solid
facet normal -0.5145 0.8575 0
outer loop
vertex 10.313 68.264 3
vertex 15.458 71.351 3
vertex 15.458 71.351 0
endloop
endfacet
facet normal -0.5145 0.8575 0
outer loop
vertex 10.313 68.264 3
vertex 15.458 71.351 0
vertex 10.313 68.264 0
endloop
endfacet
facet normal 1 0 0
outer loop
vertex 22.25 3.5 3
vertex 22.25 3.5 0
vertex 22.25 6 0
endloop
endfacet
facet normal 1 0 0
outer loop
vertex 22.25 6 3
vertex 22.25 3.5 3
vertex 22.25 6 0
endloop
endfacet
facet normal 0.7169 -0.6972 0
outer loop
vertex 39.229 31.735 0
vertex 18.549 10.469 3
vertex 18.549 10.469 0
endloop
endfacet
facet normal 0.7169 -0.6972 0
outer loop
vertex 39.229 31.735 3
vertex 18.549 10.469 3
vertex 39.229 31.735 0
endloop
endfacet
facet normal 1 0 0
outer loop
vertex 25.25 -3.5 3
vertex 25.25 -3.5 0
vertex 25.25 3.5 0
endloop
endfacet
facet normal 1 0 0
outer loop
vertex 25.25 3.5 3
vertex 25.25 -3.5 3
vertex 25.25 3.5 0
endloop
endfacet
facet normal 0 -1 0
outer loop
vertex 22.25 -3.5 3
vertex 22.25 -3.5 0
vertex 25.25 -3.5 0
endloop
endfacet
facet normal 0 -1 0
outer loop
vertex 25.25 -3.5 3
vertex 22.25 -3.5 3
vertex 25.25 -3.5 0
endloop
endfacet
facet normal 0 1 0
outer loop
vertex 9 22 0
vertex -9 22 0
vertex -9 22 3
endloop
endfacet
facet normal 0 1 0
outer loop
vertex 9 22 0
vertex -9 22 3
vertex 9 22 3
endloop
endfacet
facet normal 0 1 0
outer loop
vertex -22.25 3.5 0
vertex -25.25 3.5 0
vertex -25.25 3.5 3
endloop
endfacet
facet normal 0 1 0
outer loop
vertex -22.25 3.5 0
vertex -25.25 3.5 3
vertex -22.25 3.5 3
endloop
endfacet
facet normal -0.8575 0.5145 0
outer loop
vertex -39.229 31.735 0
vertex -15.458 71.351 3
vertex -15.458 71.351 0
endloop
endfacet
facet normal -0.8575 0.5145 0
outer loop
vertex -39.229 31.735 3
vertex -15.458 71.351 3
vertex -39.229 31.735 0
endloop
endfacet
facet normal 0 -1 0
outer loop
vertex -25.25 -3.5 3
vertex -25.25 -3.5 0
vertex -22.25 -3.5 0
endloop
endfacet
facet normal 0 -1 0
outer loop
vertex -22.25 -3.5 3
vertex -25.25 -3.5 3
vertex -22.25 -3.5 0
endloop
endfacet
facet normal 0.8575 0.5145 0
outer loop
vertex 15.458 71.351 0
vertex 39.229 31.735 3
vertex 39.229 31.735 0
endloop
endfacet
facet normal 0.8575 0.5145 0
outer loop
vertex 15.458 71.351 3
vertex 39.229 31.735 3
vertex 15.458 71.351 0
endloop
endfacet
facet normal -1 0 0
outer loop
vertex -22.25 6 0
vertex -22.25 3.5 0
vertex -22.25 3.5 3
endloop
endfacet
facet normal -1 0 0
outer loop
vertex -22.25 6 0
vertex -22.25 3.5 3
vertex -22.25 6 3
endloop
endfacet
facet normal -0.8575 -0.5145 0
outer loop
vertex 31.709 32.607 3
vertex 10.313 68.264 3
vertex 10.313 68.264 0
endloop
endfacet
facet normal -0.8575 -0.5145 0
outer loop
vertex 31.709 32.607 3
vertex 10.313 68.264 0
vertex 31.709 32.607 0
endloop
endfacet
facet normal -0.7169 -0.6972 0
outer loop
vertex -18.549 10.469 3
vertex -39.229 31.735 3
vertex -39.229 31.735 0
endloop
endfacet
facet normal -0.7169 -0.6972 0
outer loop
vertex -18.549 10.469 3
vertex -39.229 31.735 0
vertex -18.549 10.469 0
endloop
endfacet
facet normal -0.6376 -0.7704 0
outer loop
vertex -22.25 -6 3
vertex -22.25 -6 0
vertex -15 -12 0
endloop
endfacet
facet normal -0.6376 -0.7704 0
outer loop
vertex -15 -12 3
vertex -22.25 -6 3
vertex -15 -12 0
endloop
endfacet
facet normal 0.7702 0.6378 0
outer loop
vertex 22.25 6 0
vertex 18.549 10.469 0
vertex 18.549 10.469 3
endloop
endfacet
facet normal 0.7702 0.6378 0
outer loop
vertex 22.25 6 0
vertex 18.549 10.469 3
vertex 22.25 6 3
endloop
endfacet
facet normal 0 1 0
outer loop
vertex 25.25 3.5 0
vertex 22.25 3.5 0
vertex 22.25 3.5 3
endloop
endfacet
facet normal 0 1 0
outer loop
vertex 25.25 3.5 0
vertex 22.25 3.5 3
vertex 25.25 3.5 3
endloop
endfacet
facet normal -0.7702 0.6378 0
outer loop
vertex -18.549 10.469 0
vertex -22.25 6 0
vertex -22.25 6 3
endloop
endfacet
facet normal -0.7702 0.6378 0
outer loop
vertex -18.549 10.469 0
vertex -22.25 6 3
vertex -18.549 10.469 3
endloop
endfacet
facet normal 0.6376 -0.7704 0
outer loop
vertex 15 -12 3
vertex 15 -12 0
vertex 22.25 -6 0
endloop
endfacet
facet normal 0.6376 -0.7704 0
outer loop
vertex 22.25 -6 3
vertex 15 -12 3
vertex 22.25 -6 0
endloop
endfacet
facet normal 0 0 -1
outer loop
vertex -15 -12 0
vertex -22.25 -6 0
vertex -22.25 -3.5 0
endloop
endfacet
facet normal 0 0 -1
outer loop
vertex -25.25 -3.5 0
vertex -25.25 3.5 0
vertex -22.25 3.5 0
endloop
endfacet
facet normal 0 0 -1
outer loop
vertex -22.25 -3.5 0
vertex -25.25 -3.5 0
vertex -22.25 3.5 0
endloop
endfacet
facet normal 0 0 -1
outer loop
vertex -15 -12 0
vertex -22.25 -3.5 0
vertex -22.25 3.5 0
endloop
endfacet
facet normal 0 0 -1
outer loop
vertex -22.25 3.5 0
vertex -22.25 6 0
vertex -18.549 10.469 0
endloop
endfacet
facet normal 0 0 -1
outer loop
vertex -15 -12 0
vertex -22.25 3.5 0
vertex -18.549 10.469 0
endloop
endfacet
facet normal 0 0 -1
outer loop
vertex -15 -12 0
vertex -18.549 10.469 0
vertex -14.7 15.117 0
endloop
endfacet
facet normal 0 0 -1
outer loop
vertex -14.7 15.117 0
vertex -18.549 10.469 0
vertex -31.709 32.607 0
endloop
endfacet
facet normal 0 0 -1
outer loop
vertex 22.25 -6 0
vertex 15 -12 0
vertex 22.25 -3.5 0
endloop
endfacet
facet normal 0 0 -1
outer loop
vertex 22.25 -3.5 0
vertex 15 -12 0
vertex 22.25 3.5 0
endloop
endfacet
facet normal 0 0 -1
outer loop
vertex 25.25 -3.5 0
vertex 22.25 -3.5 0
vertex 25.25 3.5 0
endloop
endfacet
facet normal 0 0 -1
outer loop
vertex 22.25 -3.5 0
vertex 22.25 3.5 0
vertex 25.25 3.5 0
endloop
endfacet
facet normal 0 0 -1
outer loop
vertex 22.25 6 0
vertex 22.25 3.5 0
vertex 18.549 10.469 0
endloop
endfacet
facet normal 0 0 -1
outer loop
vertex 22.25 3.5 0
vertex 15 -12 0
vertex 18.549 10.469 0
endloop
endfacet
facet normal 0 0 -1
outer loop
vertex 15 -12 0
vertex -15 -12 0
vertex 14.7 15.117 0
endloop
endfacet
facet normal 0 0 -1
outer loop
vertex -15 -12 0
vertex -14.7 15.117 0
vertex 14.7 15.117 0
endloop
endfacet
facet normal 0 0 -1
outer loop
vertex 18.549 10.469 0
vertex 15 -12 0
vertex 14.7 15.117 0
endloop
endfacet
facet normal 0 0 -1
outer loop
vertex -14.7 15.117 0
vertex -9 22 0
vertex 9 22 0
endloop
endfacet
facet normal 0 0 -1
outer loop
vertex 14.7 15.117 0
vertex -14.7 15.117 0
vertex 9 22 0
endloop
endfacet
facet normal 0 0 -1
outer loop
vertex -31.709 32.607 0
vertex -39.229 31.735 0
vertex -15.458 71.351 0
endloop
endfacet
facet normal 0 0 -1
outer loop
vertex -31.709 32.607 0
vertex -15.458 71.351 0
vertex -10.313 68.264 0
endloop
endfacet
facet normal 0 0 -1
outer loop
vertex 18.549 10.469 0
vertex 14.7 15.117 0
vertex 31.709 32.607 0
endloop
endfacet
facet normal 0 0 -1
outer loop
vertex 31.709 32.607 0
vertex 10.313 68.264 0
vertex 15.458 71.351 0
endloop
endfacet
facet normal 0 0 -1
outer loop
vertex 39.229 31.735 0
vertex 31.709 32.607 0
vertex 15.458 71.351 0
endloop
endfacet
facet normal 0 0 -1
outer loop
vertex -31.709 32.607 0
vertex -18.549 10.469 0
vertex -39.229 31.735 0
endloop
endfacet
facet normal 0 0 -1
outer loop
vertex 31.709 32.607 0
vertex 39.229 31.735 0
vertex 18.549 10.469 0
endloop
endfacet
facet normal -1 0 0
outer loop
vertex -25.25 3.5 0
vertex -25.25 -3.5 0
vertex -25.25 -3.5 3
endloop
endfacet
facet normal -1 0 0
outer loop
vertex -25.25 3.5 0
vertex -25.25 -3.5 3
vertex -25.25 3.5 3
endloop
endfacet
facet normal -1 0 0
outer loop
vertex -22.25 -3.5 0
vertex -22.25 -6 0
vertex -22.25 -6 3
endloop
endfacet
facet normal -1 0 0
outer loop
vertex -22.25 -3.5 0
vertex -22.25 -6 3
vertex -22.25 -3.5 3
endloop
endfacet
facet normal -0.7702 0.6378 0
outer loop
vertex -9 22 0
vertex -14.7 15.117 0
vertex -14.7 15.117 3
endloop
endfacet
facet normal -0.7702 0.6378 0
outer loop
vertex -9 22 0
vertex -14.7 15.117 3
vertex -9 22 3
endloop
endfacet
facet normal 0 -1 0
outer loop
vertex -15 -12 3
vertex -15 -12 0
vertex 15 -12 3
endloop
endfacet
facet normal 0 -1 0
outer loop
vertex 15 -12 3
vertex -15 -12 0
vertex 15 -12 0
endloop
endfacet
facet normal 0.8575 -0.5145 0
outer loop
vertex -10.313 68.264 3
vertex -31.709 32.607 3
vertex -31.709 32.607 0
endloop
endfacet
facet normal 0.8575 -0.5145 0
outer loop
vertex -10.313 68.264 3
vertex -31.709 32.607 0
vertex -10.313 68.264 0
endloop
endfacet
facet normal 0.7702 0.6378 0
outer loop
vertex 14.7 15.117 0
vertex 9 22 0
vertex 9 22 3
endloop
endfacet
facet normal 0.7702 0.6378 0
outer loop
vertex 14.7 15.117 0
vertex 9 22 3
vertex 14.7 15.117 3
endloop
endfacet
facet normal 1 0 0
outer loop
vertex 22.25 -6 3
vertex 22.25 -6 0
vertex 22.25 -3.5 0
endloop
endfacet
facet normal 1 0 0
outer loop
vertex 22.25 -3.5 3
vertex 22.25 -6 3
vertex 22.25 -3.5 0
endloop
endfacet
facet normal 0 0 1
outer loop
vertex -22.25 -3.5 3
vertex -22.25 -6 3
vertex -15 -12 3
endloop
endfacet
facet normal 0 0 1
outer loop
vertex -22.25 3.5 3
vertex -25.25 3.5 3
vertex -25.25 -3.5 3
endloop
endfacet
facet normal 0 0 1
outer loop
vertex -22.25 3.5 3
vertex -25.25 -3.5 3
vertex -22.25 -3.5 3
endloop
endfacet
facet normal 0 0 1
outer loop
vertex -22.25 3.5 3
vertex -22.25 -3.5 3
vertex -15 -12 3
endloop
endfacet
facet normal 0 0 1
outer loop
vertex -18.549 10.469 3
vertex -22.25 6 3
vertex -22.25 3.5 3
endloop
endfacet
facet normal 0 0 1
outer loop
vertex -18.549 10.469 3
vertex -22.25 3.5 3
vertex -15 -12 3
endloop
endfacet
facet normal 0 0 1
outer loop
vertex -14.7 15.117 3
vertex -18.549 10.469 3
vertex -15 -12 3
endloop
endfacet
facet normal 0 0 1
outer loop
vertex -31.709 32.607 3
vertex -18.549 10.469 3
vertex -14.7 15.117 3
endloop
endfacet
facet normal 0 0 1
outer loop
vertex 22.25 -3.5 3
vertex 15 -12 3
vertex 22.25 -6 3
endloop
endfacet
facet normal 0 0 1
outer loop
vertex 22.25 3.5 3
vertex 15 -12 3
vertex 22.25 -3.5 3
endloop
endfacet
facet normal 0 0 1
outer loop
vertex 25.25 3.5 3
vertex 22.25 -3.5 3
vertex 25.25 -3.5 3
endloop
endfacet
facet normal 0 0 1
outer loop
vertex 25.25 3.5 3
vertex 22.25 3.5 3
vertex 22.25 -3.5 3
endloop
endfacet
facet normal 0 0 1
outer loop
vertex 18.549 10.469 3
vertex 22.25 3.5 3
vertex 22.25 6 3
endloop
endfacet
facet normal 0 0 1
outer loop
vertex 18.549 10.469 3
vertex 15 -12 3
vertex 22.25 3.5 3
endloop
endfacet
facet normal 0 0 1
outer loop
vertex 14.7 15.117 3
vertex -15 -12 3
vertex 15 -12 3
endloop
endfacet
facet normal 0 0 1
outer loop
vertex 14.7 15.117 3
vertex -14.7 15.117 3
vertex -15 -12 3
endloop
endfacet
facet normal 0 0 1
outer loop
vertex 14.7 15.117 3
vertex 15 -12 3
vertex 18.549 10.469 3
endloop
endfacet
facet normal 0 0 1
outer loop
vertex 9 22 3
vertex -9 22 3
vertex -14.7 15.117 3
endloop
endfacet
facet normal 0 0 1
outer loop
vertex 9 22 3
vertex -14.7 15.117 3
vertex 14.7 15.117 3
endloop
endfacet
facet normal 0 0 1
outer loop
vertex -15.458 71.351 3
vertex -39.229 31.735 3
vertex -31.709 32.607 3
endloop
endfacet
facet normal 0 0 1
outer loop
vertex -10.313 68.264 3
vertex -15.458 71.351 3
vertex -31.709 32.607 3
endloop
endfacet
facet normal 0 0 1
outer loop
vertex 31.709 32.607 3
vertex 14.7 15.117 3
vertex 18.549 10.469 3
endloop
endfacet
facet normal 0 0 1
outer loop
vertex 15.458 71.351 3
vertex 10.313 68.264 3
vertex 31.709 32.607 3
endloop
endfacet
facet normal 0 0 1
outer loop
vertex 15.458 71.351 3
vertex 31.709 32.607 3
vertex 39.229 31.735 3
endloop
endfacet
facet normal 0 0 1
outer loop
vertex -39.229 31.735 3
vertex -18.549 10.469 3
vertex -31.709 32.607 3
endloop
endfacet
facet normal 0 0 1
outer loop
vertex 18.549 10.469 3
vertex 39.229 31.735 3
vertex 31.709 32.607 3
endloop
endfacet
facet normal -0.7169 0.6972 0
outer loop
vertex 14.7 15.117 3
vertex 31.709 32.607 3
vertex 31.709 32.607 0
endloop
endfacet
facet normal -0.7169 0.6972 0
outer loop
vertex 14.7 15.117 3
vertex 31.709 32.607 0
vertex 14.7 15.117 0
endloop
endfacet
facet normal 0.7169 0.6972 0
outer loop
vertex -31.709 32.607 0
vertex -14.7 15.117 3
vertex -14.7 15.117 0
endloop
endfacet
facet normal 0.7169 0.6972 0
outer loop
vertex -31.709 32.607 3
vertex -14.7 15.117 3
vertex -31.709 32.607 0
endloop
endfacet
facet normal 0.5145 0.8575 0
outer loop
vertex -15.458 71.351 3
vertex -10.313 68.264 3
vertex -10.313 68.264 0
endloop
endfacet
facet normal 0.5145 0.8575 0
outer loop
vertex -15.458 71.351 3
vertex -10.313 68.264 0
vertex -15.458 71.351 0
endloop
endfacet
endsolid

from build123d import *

# Parameters (mm, degrees)
CROQUIS1_W              = 44.5
CROQUIS1_H              = 12
CROQUIS1_W_2            = 3
CROQUIS1_H_2            = 7
SALIENTE_EXTRUIR1_DEPTH = 3
EXTRUIR_L_MINA1_DEPTH   = 3


with BuildPart() as part:
    # Croquis1 → Saliente-Extruir1 (new body)
    with BuildSketch(Plane.XY):
        Polygon((-15, -12), (15, -12), (22.25, -6), (-22.25, -6), align=None)
        Rectangle(CROQUIS1_W, CROQUIS1_H)
        Polygon((9, 22), (22.25, 6), (-22.25, 6), (-9, 22), align=None)
        with Locations((23.75, 0)):
            Rectangle(CROQUIS1_W_2, CROQUIS1_H_2)
        with Locations((-23.75, 0)):
            Rectangle(CROQUIS1_W_2, CROQUIS1_H_2)
    extrude(amount=SALIENTE_EXTRUIR1_DEPTH)

    # Croquis2 → Extruir-Lámina1 (add, through all)
    with BuildSketch(Plane.XY.offset(3)):
        Polygon((10.313415418, 68.264367666), (31.70862995, 32.607243184), (0, 0), (-31.70862995, 32.607243184), (-10.313415418, 68.264367666), (-15.458313145, 71.35144191), (-39.229366975, 31.734759205), (0, -8.606356476), (39.229366975, 31.734759205), (15.458313145, 71.35144191), align=None)
    extrude(amount=-EXTRUIR_L_MINA1_DEPTH)


solid = part.part
